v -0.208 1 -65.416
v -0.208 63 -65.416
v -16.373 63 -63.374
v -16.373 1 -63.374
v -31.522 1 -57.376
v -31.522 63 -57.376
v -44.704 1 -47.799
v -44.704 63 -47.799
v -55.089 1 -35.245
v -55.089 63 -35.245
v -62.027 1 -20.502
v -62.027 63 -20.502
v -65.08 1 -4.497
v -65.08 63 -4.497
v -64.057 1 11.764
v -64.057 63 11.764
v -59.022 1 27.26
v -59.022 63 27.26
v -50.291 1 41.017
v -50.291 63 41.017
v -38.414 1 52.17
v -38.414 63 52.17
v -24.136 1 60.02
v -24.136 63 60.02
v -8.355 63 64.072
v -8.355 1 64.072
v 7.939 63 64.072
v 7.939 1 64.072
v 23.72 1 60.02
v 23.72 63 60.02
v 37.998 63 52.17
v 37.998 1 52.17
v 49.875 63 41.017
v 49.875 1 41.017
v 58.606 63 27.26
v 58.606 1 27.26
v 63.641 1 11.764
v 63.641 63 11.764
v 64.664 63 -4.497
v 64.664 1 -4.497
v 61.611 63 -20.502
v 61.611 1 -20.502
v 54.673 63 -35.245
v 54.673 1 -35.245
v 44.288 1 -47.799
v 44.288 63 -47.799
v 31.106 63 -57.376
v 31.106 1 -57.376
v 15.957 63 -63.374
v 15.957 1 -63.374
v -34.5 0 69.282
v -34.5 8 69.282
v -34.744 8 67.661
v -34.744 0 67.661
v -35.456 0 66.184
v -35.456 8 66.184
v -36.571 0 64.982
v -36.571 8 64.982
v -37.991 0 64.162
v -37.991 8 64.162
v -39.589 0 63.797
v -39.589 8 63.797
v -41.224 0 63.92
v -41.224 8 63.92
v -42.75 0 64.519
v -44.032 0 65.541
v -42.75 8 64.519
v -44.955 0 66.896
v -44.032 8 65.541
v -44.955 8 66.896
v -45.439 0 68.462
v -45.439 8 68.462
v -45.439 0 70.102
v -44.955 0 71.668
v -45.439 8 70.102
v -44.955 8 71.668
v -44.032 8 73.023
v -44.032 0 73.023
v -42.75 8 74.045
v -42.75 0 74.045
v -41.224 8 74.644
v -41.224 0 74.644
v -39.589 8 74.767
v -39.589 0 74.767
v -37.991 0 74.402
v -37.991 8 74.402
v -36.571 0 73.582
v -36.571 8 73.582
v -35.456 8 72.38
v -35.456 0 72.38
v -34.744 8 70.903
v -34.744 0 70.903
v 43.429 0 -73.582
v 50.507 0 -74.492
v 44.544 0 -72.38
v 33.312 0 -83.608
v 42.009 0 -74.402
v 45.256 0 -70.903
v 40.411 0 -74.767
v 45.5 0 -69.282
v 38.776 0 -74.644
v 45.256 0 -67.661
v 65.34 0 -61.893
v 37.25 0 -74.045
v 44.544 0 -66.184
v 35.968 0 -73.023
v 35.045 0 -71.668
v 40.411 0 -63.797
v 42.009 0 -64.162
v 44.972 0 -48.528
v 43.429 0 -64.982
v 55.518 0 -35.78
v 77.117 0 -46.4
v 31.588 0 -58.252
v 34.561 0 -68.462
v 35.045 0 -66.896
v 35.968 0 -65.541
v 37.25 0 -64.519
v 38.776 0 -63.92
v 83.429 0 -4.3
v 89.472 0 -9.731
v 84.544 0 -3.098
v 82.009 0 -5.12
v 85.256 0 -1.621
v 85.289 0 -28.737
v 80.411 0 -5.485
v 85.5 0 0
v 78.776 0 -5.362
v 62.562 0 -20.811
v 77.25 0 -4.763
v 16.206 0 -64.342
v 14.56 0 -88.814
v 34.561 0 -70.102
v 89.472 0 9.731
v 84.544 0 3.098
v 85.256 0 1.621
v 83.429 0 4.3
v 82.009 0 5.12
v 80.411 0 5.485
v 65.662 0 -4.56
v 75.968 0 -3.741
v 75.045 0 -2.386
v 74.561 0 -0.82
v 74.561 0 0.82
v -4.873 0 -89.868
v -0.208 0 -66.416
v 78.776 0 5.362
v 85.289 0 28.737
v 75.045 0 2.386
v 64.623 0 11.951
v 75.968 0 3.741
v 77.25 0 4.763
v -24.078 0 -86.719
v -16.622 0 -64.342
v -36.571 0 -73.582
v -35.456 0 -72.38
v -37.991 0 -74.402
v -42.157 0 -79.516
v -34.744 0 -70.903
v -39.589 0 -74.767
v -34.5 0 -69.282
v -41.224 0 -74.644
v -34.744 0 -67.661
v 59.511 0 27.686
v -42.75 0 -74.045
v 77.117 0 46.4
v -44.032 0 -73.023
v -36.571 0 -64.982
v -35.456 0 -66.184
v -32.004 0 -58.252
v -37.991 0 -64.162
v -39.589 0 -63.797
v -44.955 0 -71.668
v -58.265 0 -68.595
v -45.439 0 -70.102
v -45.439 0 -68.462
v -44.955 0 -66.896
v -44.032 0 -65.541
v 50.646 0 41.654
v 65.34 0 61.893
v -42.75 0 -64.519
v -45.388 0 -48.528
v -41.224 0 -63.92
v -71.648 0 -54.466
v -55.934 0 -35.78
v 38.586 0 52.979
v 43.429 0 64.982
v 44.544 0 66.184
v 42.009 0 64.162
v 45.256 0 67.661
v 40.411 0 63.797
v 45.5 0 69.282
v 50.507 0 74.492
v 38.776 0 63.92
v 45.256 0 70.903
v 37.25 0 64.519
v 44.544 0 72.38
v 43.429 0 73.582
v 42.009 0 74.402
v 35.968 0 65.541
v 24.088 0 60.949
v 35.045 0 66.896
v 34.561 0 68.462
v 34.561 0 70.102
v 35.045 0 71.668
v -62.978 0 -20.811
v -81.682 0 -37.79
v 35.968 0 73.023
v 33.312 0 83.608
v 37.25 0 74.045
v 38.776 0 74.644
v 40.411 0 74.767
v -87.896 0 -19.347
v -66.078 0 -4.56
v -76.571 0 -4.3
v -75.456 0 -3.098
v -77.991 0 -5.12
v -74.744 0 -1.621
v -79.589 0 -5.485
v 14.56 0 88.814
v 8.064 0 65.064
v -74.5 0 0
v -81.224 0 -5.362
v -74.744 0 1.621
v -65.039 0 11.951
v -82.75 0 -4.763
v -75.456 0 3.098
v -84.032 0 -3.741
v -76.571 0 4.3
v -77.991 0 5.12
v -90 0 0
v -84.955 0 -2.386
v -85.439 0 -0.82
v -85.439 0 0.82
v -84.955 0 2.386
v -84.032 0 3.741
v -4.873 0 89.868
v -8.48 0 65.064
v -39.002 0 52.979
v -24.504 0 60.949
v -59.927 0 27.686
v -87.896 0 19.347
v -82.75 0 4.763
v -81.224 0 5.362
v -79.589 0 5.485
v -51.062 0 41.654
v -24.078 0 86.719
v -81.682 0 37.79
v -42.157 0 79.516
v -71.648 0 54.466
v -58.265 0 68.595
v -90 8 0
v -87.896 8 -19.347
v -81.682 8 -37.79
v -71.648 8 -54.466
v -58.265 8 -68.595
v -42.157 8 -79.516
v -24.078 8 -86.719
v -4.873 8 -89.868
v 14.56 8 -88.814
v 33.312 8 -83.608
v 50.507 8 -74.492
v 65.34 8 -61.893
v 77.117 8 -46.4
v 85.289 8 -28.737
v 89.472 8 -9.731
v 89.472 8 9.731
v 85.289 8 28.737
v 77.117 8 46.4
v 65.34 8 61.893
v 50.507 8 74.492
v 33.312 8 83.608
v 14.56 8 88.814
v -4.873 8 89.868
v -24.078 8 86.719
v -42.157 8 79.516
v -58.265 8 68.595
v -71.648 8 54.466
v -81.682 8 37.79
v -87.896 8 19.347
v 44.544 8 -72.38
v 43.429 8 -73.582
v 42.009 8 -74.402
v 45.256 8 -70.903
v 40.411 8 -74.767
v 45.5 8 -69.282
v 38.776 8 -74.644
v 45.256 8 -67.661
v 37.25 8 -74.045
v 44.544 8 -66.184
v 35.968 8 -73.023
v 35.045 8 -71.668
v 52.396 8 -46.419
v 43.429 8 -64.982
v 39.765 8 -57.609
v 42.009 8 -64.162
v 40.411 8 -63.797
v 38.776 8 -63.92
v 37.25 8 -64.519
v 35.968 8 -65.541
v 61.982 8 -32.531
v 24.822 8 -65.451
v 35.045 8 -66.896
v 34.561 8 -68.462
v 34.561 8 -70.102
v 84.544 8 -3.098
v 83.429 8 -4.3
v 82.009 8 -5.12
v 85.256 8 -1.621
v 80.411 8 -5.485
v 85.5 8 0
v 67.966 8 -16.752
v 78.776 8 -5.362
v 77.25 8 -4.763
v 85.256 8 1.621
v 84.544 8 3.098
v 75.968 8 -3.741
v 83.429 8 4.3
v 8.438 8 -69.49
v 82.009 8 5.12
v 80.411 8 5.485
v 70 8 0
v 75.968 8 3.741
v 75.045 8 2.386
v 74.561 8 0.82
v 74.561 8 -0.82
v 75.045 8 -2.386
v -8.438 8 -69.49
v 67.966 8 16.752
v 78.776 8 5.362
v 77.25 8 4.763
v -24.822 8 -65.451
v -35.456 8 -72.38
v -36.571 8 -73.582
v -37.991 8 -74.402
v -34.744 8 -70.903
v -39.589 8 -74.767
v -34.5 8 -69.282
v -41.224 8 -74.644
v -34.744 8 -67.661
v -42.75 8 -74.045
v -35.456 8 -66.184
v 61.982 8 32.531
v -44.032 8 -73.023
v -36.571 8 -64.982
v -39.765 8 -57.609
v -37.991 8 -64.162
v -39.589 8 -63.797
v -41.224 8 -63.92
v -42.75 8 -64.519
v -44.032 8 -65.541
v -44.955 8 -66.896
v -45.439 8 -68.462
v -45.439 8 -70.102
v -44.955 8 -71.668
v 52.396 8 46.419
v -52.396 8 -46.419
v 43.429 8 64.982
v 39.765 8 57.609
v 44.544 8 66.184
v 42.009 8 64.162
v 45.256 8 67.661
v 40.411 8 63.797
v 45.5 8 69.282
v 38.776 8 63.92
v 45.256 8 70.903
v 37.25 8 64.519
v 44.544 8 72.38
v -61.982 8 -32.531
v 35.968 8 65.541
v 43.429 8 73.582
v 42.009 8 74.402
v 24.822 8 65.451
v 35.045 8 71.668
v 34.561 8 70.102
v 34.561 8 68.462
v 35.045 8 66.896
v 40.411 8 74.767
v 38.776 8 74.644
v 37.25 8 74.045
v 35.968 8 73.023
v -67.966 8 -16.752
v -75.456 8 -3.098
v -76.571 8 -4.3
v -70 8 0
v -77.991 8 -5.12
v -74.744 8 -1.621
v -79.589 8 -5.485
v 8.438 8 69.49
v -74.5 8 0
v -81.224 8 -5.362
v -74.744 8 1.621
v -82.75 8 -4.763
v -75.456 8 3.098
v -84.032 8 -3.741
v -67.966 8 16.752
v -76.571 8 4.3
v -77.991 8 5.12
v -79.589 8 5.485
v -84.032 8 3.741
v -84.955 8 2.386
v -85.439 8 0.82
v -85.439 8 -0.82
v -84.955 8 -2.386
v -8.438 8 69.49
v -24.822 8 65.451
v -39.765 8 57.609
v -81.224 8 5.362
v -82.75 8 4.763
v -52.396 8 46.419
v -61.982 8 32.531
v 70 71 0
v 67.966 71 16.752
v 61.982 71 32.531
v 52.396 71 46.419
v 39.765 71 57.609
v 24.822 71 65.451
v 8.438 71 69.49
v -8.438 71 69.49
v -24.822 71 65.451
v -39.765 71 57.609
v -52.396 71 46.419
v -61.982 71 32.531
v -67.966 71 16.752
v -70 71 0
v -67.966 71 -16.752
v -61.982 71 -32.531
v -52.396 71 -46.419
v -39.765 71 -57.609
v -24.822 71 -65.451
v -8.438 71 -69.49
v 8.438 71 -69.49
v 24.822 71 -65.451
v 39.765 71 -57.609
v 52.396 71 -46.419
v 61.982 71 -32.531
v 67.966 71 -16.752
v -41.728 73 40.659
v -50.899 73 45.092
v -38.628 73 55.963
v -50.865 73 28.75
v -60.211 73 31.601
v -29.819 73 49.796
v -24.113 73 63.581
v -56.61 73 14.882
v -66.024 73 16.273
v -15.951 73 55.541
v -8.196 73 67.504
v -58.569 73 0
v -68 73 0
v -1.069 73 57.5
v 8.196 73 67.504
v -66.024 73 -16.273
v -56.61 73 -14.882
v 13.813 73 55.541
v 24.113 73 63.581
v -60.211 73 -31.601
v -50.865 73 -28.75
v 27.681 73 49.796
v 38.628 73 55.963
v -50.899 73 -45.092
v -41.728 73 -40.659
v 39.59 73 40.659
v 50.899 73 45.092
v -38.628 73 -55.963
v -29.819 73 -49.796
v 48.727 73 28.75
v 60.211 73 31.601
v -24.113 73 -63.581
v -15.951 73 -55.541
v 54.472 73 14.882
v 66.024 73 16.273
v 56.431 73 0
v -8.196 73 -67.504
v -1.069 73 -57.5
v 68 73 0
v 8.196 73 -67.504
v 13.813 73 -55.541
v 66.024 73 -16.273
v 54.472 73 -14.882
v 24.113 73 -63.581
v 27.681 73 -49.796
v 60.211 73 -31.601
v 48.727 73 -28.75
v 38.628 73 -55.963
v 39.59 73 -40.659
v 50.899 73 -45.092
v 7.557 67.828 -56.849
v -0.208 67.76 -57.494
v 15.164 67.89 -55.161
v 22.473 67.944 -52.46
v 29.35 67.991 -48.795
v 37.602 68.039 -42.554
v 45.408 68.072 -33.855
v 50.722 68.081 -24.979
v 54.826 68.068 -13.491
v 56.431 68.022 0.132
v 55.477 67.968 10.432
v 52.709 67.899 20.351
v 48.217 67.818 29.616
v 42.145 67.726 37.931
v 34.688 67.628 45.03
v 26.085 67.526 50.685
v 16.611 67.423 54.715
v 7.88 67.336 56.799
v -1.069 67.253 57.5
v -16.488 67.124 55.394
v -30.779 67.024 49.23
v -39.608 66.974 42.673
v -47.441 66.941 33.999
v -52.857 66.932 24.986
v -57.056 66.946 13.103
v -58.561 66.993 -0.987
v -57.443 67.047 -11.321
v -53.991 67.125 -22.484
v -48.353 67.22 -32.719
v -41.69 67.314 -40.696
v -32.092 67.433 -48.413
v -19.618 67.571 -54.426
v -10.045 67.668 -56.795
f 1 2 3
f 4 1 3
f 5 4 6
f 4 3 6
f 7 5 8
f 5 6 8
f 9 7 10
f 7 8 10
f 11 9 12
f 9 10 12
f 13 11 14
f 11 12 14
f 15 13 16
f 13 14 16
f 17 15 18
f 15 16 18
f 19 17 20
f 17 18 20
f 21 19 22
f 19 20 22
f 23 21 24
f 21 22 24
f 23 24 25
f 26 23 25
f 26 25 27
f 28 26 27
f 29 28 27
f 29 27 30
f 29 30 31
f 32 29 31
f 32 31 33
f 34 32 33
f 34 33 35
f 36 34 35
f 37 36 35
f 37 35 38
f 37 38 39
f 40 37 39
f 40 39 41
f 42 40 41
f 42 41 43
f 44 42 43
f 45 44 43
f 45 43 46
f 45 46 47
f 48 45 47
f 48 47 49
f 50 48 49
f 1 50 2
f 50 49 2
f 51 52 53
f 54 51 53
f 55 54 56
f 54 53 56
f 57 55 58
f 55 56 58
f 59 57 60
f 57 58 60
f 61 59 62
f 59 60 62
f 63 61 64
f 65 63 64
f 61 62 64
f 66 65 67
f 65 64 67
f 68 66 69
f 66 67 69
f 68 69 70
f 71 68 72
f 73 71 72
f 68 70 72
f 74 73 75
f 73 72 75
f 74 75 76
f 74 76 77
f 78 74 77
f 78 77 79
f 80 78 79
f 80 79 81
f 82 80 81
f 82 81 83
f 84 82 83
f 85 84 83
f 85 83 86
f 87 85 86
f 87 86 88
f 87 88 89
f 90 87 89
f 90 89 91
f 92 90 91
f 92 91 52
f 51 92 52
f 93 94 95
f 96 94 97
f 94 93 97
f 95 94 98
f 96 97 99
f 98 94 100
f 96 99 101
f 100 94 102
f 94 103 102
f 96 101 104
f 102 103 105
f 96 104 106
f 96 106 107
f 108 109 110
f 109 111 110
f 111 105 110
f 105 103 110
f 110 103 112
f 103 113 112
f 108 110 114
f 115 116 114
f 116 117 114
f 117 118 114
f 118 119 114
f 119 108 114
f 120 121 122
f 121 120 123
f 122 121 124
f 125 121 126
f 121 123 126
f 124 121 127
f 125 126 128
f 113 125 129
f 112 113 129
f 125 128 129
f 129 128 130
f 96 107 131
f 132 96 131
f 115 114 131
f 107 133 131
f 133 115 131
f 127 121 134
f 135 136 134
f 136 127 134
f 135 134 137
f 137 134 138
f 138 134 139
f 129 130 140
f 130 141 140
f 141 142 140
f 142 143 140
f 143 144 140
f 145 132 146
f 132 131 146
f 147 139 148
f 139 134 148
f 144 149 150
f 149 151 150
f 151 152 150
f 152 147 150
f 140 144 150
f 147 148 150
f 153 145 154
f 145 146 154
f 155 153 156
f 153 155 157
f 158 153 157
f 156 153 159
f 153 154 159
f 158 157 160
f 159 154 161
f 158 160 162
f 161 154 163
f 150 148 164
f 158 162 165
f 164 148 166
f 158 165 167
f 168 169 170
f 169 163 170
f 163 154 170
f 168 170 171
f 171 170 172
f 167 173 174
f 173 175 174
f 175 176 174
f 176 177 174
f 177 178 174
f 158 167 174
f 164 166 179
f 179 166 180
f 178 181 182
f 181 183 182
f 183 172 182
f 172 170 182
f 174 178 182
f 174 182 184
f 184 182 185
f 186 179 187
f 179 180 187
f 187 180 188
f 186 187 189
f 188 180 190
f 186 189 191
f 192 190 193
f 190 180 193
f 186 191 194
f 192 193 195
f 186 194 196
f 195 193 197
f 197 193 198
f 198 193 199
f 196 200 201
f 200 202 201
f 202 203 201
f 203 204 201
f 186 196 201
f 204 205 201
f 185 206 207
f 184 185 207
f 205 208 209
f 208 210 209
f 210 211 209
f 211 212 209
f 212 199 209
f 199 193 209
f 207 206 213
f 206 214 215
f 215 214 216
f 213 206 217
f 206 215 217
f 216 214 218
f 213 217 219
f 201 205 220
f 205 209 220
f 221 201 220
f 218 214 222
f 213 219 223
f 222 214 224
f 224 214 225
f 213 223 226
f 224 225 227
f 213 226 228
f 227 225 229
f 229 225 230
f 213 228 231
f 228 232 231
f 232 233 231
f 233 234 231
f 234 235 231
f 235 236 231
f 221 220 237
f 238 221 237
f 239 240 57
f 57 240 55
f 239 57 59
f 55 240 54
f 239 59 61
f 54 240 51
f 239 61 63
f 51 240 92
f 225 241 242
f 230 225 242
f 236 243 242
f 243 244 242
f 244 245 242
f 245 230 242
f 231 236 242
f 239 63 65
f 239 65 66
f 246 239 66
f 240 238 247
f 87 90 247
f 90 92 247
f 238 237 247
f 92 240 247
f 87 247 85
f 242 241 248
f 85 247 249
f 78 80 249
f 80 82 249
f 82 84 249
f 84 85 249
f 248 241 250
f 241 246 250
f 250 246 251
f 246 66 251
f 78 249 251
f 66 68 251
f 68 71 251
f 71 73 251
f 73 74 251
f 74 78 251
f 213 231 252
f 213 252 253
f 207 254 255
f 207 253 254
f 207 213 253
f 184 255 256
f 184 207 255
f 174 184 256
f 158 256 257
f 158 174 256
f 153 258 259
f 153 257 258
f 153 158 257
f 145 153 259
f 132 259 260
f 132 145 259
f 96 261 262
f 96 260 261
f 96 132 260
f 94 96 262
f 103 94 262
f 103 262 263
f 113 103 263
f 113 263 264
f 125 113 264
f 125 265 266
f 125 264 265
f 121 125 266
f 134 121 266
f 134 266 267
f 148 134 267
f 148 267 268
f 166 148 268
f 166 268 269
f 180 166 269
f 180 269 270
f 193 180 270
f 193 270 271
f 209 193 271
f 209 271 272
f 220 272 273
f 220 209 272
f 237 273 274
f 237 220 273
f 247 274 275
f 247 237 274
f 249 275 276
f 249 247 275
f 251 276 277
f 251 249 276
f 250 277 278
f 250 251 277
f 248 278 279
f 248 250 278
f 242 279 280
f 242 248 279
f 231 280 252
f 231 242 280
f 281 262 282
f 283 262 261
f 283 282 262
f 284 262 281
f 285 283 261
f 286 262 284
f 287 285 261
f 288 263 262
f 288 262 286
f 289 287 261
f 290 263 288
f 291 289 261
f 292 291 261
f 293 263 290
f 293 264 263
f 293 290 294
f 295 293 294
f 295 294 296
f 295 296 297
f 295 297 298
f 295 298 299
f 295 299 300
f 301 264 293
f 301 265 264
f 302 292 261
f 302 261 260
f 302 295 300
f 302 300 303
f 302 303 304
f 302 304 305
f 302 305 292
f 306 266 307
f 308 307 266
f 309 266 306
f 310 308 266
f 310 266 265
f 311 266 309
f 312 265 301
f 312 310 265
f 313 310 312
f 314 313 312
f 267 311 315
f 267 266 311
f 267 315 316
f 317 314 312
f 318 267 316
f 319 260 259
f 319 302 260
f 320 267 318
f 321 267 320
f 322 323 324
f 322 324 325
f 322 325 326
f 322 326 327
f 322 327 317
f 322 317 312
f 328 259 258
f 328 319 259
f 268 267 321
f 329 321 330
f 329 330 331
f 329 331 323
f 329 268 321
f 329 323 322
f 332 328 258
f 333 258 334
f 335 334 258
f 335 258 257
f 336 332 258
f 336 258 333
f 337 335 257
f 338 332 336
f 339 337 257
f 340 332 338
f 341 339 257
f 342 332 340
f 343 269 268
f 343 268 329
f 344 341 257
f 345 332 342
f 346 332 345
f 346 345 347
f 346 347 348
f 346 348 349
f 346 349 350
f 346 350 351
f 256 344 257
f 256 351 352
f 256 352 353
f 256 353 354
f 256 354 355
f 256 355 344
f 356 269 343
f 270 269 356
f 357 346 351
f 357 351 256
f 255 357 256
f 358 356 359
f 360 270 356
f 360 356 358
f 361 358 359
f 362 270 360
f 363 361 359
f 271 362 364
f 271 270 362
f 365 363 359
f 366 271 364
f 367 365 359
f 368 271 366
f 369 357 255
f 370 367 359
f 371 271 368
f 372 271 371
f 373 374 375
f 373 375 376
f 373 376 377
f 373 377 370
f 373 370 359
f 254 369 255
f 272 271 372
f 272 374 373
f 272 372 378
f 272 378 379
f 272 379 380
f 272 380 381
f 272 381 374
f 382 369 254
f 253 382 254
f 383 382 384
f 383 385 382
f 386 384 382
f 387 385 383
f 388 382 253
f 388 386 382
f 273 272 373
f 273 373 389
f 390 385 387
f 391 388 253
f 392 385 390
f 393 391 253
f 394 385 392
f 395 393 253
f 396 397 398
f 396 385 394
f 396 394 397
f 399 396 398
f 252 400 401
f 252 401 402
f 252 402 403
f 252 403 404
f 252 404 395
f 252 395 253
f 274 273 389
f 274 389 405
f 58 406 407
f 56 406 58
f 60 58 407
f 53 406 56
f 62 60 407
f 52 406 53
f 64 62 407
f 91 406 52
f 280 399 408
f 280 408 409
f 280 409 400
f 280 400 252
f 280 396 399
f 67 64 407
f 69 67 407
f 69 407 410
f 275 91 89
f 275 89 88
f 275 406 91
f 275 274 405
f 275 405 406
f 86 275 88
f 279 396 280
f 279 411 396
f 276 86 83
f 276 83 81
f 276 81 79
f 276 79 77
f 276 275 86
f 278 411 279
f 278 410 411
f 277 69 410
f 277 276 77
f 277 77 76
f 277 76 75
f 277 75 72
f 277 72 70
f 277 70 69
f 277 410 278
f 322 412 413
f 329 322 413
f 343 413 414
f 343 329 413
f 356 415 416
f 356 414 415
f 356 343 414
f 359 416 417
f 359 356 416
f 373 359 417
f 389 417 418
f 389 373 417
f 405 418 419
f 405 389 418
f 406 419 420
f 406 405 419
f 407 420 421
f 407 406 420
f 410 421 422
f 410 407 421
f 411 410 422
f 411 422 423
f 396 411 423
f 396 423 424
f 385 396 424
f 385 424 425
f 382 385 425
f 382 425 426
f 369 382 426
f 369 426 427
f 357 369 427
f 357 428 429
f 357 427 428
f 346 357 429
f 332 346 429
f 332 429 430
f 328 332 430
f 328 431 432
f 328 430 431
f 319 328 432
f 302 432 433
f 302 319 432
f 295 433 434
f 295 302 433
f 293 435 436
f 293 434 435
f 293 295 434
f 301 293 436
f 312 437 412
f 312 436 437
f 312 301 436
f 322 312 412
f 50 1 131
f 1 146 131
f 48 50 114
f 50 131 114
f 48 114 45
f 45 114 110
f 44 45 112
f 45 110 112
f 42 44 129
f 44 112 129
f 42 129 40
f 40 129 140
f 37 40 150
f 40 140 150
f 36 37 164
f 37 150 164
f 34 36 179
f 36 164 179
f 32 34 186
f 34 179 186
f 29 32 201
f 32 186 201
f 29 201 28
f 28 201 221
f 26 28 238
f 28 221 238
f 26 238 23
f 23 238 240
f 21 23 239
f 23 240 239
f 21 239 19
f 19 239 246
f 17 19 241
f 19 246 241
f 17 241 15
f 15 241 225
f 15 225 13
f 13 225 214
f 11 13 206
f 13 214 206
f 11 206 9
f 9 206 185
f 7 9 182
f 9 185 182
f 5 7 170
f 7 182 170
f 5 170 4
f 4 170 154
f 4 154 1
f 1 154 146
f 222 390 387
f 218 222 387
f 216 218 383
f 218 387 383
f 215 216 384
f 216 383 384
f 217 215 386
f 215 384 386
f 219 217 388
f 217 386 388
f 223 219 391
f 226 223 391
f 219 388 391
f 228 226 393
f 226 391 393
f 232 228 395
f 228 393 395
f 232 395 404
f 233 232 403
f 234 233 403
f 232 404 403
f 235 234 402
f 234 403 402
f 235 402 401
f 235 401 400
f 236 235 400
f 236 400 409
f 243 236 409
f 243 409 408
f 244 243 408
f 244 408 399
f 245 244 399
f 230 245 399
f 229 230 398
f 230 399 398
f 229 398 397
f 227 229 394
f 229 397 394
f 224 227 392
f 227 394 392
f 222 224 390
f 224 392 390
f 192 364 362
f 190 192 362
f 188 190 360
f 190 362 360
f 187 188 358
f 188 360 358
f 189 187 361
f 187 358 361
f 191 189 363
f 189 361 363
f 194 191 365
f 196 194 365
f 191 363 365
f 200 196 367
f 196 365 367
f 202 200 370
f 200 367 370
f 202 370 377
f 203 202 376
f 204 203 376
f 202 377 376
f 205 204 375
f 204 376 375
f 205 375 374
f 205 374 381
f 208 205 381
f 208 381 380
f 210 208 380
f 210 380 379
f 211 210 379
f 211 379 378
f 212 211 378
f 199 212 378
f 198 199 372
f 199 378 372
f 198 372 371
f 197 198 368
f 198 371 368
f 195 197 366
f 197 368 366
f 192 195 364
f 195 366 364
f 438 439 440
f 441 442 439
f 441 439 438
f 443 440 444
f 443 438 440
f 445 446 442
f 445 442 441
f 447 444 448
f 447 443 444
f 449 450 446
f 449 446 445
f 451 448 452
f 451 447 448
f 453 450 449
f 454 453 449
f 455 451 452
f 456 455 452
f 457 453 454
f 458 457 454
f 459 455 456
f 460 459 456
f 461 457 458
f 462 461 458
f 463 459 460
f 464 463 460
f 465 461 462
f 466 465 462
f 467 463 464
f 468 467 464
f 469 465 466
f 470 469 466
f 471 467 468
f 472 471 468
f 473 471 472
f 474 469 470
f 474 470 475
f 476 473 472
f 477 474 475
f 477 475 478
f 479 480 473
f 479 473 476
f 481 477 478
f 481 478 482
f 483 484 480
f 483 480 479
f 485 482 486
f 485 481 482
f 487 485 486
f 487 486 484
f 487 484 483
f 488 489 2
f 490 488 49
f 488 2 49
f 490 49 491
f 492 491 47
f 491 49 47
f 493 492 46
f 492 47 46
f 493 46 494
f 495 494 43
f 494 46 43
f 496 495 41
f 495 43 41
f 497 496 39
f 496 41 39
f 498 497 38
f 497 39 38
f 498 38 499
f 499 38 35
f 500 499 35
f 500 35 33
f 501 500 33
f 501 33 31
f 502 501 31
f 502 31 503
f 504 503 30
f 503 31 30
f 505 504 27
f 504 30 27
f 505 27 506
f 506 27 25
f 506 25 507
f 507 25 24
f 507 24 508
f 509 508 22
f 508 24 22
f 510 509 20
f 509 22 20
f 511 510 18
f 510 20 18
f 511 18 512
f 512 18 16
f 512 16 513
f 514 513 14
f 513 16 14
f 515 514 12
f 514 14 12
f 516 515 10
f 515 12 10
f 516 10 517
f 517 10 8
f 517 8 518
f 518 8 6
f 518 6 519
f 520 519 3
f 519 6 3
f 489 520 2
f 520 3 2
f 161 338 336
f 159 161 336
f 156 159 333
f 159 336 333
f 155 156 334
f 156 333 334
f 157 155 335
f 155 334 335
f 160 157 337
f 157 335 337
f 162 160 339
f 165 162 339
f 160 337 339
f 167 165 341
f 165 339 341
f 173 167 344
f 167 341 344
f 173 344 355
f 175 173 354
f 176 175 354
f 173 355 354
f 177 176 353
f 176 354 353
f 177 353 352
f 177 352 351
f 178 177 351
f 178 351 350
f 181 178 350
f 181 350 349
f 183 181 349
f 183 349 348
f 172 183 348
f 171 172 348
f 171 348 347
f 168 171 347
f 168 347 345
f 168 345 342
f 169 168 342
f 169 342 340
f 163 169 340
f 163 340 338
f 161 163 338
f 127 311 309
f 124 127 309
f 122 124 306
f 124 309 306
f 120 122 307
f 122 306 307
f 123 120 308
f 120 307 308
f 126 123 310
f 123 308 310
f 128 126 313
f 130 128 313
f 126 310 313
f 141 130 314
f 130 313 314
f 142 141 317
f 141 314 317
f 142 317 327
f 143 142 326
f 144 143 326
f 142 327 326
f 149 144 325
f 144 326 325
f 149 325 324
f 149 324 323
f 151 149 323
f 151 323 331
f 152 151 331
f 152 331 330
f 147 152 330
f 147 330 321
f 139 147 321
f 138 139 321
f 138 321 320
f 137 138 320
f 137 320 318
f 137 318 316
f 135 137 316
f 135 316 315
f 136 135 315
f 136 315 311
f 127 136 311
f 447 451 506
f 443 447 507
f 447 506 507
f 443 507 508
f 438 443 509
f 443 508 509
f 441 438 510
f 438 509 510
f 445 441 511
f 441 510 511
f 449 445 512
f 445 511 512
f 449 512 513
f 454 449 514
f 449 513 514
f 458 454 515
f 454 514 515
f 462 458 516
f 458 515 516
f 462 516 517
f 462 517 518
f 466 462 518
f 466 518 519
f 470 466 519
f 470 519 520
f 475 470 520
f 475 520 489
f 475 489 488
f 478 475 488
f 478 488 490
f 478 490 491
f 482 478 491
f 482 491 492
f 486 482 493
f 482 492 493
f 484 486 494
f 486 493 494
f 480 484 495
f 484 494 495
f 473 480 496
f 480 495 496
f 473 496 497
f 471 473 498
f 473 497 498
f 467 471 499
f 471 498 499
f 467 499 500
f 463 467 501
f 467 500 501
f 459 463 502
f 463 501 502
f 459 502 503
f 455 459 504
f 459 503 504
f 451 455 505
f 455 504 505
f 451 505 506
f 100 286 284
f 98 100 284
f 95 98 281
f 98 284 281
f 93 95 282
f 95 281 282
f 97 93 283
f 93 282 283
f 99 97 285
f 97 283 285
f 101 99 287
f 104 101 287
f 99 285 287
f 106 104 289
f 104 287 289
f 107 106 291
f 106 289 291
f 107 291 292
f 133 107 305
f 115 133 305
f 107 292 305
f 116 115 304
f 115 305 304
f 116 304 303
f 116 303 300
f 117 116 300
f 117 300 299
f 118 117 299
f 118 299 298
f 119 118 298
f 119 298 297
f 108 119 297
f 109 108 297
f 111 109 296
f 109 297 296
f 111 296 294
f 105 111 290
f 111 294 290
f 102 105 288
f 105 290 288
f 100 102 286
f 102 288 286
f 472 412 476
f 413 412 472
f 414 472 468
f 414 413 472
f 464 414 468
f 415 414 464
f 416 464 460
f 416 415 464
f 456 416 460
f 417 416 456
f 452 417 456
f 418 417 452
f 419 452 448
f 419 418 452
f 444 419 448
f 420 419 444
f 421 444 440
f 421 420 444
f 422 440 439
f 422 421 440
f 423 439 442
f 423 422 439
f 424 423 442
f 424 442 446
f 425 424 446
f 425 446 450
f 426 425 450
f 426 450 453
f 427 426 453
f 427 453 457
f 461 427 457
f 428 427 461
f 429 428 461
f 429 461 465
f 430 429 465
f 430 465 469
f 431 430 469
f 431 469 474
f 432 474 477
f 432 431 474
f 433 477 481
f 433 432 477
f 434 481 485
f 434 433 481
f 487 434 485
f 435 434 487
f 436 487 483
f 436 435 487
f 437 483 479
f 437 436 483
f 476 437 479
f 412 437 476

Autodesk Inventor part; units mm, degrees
ref_plane "YZ Plane" through (0, 0, 0) normal (1, 0, 0) x (0, 1, 0)
ref_plane "XZ Plane" through (0, 0, 0) normal (0, 1, 0) x (-1, 0, 0)
ref_plane "XY Plane" through (0, 0, 0) normal (0, 0, 1) x (1, 0, 0)
sketch "Эскиз1" plane through (0, 0, 0) normal (0, 1, 0) x (-1, 0, 0)
  circle A0 centre (0, 0) radius 90
  dimension "d0" = 180
extrude "Выдавливание1" add sketch "Эскиз1" along normal blind 8
sketch "Эскиз2" plane through (0, 8, 0) normal (0, 1, 0) x (1, 0, 0)
  circle A0 centre (0, 0) radius 70
  dimension "d3" = 140
extrude "Выдавливание2" add sketch "Эскиз2" along normal blind 65
hole "Отверстие1" at (-1.069, 73, 0) direction (0, -1, 0) diameter 115 depth 10 tip angle 118
hole "Отверстие2" at (-0.208, 0, -0.4159) direction (0, 1, 0) diameter 130 depth 63 tip angle 118
chamfer "Фаска1" distance 2 angle 45 1 edges at (-70, 73, 0)
chamfer "Фаска2" distance 1 angle 45 1 edges at (-0.208, 0, 64.5841)
sketch "Эскиз3" plane through (0, 8, 0) normal (0, 1, 0) x (1, 0, 0)
  circle A0 centre (0, 0) radius 80
  circle A1 centre (80, 0) radius 5.5
  circle A2 centre (40, -69.282) radius 5.5
  circle A3 centre (-40, -69.282) radius 5.5
  circle A4 centre (-80, 0) radius 5.5
  circle A5 centre (-40, 69.282) radius 5.5
  circle A6 centre (40, 69.282) radius 5.5
  dimension "d30" = 160
  dimension "d31" = 11
  dimension "d34" = 360
extrude "Выдавливание3" cut sketch "Эскиз3" against normal blind 100 contours A0 A1 | A0 A1 | A6 A0 | A0 A6 | A2 A0 | A0 A2 | A5 A0 | A0 A5 | A3 A0 | A0 A3 | A4 A0 | A0 A4
sketch "Эскиз4" plane through (0, 0, 0) normal (0, -1, 0) x (1, 0, 0)
  point P0 (0, 0)
